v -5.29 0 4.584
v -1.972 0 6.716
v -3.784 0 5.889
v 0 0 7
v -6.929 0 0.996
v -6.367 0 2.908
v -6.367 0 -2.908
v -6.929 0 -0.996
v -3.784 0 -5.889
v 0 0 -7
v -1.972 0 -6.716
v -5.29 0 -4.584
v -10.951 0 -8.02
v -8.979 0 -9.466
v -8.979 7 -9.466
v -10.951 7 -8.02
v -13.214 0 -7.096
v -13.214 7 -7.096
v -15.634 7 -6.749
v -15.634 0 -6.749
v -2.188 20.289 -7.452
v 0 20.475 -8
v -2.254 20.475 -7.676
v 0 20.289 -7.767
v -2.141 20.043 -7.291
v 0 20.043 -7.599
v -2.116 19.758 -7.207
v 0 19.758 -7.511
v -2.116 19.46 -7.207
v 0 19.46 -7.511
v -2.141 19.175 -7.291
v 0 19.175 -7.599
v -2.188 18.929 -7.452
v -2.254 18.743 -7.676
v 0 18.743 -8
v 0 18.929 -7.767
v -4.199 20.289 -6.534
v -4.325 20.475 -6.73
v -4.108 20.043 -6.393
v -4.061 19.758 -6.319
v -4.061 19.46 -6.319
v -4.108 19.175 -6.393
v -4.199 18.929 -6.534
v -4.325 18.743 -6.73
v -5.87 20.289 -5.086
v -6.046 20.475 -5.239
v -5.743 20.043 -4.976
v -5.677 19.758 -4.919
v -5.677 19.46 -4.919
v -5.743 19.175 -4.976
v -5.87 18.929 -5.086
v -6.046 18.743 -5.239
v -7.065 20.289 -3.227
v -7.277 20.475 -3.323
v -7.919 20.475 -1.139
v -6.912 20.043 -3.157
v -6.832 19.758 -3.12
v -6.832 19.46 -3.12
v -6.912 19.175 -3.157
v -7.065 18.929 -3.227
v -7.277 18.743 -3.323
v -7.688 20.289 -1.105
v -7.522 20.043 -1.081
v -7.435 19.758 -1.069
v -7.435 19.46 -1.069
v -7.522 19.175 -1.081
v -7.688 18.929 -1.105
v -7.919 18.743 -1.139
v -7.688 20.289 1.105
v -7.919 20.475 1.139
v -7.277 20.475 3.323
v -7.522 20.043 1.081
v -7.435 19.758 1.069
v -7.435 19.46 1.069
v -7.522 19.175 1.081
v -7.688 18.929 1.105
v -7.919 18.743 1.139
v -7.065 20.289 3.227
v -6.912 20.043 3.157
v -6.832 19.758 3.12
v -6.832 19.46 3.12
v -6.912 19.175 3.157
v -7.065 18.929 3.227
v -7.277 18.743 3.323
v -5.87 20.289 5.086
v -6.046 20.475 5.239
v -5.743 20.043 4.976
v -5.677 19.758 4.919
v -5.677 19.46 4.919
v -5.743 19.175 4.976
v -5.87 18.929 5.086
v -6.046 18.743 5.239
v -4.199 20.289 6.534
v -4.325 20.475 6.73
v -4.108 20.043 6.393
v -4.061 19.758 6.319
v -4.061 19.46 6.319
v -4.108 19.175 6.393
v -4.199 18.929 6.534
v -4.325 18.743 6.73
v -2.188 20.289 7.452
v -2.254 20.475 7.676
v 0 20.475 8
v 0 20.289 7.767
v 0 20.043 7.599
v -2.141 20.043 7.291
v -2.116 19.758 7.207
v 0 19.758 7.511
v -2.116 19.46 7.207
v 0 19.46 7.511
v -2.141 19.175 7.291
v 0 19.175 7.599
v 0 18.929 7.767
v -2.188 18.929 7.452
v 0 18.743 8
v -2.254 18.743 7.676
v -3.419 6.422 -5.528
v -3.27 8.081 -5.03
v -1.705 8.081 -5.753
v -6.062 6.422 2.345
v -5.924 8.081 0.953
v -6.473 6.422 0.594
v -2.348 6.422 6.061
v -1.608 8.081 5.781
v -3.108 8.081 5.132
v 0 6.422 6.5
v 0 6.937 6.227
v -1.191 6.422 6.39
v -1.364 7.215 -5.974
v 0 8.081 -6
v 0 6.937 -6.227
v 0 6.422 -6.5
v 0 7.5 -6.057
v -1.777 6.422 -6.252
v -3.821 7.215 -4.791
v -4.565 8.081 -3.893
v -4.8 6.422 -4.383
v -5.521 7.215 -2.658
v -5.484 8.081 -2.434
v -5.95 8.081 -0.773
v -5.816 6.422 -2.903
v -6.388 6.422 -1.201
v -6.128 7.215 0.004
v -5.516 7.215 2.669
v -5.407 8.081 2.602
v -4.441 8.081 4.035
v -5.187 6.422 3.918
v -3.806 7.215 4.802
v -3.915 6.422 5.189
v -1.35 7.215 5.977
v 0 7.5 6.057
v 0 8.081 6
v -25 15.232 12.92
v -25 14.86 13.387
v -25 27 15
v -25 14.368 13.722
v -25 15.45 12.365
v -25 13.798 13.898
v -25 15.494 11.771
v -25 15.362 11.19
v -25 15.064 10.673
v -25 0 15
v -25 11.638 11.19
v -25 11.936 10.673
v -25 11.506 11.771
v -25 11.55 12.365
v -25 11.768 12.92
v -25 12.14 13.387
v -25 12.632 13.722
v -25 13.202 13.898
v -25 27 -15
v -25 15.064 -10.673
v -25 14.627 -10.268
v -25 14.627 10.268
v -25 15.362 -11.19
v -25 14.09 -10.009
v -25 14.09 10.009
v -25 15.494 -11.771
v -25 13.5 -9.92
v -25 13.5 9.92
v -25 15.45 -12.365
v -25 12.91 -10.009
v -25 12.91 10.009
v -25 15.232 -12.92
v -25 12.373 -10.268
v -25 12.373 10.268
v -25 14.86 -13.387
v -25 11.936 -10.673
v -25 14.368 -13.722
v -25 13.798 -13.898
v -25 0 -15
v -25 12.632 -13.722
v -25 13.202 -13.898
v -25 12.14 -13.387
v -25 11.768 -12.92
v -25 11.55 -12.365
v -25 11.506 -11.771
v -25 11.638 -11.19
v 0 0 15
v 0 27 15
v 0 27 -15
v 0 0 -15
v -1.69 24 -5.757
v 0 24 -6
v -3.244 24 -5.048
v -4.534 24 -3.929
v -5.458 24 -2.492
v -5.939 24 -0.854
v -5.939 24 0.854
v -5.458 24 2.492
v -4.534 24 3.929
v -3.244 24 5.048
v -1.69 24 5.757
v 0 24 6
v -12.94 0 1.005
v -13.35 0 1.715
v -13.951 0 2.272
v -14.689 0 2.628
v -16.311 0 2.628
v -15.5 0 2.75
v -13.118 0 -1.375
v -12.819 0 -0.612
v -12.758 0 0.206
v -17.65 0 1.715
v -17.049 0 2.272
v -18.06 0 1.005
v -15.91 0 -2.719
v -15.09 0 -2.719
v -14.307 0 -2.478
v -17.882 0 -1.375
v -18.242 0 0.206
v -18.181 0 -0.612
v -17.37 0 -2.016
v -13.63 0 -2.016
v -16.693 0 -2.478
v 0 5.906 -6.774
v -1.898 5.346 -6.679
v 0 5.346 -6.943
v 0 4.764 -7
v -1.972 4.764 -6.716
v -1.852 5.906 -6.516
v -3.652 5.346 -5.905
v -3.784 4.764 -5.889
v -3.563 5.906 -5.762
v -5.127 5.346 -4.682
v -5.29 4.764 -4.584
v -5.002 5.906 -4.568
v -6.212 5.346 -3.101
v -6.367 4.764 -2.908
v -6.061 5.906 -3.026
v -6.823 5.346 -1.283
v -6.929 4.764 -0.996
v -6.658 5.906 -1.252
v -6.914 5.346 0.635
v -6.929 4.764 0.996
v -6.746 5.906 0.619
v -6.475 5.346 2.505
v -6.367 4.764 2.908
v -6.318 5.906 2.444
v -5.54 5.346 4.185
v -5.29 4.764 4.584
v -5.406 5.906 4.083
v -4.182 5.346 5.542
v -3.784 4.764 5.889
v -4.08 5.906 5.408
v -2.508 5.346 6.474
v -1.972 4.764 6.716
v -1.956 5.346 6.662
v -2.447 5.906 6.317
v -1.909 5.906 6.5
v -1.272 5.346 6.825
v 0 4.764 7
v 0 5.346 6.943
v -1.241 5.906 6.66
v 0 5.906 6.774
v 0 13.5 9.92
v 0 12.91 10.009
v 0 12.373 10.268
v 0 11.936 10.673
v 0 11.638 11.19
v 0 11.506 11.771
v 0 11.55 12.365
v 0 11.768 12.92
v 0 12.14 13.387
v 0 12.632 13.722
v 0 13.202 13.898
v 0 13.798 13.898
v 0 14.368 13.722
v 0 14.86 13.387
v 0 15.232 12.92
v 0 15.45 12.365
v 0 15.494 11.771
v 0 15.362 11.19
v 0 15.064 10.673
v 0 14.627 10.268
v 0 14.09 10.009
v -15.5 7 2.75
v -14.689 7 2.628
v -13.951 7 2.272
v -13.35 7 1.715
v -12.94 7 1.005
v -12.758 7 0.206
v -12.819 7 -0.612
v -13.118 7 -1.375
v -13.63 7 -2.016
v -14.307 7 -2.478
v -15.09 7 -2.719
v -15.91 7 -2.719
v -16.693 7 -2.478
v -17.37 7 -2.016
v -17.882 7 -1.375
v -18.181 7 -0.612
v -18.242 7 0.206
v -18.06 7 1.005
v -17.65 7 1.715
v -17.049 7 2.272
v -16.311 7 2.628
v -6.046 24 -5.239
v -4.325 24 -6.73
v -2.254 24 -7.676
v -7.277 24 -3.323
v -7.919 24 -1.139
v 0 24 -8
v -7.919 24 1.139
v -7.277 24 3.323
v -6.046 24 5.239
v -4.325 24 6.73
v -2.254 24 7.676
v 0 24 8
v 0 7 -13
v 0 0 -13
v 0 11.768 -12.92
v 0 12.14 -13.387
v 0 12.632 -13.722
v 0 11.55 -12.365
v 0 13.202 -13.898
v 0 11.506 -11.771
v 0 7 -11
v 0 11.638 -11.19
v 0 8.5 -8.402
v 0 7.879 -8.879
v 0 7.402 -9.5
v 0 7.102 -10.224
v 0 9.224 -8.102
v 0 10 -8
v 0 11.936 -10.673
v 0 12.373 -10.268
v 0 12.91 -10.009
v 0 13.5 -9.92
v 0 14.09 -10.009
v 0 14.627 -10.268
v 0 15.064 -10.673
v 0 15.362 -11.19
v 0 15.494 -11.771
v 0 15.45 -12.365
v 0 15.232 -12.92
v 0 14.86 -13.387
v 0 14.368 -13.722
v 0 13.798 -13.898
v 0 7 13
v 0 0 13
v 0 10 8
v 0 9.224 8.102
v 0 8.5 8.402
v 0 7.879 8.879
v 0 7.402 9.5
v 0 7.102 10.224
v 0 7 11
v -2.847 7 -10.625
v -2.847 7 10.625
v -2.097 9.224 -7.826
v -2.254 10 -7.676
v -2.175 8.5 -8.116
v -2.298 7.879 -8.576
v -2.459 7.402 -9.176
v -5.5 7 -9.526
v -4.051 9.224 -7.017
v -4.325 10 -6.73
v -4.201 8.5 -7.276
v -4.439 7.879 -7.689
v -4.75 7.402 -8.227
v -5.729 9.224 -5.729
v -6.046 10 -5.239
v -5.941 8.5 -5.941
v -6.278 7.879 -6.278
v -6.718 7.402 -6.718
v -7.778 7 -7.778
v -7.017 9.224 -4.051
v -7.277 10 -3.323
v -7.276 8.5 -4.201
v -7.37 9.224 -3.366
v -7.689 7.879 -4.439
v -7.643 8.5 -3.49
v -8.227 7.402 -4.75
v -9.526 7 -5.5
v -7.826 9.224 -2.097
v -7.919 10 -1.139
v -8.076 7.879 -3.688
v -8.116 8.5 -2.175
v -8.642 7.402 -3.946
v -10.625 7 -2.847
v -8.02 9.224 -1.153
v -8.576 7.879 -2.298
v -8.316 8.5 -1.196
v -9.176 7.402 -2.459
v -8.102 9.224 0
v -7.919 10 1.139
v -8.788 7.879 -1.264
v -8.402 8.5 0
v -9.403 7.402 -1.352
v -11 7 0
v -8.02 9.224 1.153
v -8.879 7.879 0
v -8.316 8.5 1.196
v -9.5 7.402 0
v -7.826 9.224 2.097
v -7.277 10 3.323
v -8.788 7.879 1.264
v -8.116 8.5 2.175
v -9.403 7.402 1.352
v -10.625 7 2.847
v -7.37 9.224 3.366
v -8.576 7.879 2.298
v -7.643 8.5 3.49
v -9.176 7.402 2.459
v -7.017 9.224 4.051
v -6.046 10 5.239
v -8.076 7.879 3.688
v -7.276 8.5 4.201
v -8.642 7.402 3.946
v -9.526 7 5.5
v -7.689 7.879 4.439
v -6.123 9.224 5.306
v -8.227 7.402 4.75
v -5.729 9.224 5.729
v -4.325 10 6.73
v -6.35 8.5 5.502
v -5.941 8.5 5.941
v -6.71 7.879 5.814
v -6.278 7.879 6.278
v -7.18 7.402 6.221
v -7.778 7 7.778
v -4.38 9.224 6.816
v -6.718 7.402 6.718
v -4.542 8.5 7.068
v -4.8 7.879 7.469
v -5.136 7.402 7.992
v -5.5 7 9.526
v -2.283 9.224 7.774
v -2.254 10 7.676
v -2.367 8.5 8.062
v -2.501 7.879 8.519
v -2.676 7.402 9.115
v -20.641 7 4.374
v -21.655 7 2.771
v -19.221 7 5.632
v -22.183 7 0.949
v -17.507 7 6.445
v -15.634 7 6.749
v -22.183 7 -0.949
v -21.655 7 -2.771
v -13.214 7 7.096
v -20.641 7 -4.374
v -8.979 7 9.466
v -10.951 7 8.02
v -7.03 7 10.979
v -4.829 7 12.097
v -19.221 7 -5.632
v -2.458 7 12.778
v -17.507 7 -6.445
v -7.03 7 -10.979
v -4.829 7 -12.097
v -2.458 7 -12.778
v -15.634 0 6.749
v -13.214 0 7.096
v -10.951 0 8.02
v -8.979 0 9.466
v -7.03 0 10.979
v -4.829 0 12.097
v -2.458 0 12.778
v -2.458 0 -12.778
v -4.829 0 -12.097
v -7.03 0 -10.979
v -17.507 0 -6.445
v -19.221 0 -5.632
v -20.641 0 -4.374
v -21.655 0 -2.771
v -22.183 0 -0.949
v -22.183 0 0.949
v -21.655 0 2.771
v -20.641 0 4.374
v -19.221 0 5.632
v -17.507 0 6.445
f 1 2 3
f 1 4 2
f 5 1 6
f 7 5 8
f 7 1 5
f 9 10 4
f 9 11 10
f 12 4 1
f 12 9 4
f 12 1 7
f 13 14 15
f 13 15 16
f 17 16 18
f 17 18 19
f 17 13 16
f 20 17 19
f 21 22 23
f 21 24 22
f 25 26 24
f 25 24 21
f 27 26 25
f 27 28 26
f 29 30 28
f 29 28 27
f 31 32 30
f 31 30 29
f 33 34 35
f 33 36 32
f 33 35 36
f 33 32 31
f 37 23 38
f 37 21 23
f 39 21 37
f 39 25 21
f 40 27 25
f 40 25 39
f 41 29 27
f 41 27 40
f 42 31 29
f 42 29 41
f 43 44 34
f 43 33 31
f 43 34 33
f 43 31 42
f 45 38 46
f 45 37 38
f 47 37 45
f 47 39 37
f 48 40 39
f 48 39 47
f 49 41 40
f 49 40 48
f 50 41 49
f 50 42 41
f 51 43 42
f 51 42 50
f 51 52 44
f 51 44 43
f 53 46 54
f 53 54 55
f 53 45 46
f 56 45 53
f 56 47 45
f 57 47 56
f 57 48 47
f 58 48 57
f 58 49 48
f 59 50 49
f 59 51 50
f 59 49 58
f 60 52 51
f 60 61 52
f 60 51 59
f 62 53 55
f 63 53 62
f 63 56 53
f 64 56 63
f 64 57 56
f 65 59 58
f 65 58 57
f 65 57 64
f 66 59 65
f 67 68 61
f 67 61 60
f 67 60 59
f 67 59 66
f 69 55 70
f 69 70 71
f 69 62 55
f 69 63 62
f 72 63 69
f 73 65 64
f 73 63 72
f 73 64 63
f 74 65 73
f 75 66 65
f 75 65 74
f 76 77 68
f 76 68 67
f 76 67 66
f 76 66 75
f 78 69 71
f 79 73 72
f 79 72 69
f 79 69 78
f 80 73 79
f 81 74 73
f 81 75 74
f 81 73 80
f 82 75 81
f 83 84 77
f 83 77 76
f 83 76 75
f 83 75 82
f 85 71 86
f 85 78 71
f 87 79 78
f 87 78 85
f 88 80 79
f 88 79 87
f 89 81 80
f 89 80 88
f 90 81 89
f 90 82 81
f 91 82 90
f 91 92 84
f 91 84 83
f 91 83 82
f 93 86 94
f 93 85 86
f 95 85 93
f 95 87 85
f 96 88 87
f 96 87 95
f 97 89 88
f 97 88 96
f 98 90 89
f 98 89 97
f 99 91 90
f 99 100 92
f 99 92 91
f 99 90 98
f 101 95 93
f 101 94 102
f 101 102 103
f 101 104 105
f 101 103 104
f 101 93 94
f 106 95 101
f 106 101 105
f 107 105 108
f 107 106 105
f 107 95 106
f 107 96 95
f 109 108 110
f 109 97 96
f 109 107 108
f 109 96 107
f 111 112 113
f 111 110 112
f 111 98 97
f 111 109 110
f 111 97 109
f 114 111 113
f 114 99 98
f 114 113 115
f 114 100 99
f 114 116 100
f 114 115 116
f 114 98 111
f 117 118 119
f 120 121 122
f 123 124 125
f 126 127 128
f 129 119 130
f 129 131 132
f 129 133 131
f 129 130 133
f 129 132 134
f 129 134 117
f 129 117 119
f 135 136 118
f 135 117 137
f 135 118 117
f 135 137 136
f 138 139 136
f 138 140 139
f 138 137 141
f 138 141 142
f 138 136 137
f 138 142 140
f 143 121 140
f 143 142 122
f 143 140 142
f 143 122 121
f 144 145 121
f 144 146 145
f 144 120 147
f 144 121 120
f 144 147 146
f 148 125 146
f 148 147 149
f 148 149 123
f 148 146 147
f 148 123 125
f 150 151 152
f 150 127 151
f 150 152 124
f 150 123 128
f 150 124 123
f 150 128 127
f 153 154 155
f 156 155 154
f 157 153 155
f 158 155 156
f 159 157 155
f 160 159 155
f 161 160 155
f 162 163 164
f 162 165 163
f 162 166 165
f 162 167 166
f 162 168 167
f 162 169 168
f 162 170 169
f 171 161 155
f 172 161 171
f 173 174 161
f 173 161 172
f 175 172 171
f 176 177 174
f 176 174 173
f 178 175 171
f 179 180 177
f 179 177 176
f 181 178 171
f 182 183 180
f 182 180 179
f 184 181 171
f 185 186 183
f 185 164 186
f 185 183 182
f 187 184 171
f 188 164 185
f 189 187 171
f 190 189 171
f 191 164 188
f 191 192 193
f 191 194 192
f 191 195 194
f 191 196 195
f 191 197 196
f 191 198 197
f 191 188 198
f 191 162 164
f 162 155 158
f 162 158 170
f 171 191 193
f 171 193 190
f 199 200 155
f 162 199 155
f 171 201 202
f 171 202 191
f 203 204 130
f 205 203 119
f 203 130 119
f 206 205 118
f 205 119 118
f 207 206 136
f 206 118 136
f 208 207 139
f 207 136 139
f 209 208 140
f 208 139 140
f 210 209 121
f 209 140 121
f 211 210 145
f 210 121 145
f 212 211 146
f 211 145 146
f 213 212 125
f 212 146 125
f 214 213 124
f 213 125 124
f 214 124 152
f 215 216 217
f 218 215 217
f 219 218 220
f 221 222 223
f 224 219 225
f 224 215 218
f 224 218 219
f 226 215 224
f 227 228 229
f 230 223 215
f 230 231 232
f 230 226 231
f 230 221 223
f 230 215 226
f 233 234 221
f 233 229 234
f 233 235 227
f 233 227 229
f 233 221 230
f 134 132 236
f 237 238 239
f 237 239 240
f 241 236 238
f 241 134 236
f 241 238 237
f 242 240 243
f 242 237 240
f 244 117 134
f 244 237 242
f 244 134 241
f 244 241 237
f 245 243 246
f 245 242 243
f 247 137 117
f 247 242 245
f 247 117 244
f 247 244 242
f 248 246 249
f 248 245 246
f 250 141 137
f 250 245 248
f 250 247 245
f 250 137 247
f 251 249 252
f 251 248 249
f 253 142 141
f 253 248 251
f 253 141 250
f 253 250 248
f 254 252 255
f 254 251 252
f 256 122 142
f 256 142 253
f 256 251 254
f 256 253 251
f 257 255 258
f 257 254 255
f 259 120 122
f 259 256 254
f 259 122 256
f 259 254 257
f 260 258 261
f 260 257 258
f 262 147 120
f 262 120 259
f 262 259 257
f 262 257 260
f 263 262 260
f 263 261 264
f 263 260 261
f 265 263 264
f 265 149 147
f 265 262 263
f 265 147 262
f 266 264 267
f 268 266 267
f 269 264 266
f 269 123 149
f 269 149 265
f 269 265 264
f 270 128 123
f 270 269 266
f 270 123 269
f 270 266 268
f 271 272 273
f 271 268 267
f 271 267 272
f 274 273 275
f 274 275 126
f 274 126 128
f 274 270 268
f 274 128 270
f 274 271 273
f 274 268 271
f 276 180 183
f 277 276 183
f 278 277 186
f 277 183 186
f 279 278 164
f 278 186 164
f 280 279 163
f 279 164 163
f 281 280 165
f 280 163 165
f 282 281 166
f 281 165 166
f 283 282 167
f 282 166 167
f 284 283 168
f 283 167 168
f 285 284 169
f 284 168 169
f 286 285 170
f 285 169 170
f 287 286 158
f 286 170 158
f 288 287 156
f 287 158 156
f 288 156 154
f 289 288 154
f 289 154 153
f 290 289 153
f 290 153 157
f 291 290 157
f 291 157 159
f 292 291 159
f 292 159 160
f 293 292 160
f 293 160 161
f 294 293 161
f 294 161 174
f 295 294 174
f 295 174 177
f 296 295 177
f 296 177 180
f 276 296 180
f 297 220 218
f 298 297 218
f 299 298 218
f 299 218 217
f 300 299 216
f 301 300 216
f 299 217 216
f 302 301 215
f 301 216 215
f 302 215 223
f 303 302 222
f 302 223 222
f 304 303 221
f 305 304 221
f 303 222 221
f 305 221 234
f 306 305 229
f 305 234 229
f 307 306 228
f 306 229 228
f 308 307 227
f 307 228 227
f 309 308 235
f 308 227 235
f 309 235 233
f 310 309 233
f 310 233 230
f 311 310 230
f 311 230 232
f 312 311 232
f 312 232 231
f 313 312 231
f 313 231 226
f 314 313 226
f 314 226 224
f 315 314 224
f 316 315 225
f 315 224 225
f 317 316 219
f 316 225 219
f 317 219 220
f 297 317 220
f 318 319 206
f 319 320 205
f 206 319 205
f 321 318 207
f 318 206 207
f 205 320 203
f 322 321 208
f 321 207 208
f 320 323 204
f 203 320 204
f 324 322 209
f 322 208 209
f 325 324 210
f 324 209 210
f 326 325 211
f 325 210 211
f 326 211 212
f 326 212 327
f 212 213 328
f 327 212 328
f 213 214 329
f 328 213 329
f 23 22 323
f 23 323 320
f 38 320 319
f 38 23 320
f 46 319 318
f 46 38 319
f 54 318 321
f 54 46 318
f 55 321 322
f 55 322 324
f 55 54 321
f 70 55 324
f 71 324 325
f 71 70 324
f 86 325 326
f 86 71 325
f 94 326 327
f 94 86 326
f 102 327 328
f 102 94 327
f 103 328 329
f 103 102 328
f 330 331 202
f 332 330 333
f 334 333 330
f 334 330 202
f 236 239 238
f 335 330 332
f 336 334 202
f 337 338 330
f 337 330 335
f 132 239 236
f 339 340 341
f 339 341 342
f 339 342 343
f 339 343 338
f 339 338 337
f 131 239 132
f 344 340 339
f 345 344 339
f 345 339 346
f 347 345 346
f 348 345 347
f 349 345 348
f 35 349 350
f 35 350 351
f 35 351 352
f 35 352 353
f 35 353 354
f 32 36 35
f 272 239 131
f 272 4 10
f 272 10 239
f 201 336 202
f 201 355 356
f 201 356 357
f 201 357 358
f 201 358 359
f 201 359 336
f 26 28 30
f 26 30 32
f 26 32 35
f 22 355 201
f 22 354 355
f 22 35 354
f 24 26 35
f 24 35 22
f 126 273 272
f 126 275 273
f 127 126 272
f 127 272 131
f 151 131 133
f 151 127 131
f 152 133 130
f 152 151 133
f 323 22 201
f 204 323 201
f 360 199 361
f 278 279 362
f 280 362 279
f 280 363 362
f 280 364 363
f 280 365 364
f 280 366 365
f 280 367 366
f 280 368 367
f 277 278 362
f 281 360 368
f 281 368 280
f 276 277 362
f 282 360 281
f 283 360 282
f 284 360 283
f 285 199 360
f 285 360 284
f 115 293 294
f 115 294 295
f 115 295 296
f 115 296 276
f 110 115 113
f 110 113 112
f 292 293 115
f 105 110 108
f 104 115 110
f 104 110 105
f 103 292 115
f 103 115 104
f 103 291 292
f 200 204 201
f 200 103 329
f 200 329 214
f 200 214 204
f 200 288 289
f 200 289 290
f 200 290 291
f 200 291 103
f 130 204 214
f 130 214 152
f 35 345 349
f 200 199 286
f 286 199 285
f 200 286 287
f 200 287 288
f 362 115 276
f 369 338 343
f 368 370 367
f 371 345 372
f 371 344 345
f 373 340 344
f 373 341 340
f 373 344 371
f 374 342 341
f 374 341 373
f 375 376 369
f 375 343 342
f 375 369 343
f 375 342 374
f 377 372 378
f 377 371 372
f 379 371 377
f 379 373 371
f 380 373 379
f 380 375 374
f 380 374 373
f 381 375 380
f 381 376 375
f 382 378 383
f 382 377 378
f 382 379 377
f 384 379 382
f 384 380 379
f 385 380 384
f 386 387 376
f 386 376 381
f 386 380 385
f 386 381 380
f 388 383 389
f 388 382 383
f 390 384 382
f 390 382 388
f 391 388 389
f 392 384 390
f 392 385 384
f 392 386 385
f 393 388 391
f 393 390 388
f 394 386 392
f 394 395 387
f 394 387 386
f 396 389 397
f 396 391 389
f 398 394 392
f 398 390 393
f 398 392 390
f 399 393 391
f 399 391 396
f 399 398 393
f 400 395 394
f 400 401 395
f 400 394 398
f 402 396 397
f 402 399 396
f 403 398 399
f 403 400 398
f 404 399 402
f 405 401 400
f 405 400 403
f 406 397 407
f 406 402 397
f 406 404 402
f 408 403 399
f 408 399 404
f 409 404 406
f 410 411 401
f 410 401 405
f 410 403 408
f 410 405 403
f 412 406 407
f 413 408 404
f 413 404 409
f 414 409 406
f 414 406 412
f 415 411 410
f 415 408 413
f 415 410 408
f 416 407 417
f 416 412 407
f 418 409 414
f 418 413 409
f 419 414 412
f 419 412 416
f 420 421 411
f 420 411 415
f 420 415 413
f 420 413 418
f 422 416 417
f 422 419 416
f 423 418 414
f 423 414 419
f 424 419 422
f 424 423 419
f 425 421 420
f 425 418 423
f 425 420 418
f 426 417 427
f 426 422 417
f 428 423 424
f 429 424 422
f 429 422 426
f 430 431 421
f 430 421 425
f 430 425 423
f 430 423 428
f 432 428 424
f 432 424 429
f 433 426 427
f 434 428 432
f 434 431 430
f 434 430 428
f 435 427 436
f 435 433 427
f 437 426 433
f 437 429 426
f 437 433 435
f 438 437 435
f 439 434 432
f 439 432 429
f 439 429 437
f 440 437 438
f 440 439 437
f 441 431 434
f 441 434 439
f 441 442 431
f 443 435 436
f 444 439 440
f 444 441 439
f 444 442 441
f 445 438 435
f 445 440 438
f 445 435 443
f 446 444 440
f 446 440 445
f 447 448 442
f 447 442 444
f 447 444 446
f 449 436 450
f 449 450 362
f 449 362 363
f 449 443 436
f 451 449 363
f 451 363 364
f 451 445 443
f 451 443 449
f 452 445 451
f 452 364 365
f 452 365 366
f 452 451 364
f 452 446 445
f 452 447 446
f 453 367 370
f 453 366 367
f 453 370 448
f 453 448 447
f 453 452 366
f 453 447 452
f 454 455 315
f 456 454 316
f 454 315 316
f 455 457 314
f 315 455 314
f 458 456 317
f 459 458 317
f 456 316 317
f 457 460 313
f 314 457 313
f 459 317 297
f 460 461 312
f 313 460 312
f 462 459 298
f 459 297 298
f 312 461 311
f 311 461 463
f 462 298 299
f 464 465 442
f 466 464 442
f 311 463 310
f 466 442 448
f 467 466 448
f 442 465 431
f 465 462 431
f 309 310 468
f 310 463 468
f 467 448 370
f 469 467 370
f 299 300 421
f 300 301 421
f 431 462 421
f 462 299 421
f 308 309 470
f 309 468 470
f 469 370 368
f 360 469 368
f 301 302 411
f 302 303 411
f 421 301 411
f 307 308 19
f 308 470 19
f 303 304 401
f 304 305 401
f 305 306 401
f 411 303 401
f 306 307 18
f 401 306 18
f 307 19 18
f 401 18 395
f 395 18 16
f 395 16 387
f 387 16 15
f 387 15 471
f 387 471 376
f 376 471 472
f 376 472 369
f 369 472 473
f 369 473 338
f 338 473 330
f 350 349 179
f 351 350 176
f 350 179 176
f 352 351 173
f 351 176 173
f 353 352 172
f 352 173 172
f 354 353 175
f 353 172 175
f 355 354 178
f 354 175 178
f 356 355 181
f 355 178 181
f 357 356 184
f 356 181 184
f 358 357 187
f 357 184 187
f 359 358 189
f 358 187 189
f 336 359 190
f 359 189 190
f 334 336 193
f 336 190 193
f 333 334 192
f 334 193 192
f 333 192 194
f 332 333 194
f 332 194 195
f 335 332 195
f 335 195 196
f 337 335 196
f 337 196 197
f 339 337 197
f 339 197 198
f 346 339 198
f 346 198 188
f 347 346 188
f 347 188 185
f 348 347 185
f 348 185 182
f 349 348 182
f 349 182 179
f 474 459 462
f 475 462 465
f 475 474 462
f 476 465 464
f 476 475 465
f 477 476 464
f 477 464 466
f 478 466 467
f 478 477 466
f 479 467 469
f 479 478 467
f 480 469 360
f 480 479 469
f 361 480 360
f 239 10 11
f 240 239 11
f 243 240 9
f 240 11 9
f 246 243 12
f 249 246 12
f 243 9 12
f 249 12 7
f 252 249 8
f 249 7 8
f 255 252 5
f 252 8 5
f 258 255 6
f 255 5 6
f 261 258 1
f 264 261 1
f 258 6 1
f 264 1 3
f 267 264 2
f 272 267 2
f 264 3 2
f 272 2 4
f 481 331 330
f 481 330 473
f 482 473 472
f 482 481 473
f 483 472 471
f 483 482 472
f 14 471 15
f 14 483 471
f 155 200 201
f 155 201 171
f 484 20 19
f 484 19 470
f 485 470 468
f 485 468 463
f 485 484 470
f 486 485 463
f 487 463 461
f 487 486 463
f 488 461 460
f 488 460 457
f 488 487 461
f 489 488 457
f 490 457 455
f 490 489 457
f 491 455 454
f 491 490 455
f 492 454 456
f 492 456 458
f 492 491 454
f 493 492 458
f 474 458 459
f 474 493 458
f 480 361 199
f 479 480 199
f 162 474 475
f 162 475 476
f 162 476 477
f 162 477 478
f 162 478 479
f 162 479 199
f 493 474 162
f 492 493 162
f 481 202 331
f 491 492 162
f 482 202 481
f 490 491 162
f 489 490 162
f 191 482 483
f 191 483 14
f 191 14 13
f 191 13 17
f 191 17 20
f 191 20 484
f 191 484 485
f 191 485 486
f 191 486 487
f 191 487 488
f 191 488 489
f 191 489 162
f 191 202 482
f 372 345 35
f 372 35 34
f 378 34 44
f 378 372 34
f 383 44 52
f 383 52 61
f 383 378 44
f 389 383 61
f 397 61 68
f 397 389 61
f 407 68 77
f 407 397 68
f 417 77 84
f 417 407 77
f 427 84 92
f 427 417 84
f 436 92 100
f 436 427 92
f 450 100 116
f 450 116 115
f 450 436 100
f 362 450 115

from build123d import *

# Parameters (mm, degrees)
SKETCH1_R            = 7
SKETCH1_R_2          = 2.75
SKETCH1_R_3          = 3.659852489
BOSS_EXTRUDE1_DEPTH  = 7
SKETCH2_R            = 8
SKETCH2_R_2          = 6
BOSS_EXTRUDE2_DEPTH  = 17
FILLET1_R            = 3
FILLET2_R            = 3
SKETCH3_R            = 1
SKETCH5_W            = 50
SKETCH5_H            = 30
BOSS_EXTRUDE3_DEPTH  = 27
SKETCH6_R            = 2
CUT_EXTRUDE1_DEPTH   = 57
INTERSECT3_OUTLINE_W = 27
INTERSECT3_OUTLINE_H = 30
INTERSECT3_OUTLINE_R = 2
INTERSECT3_DEPTH     = 25


with BuildPart() as part:
    # Sketch1 → Boss-Extrude1 (new body)
    with BuildSketch(Plane(origin=(0, 0, 0), x_dir=(1, 0, 0), z_dir=(0, 1, 0))):
        with BuildLine():
            ThreePointArc((-15.634333704, 6.748663161), (-22.25, 0), (-15.634333704, -6.748663161))
            ThreePointArc((-15.634333704, -6.748663161), (-12.054001616, -7.488359295), (-8.978814065, -9.465516285))
            ThreePointArc((-8.978814065, -9.465516285), (-0.448762307, -12.99442036), (8.273320847, -9.971141939))
            ThreePointArc((8.273320847, -9.971141939), (11.493139678, -8.165901558), (15.148520579, -7.651784261))
            ThreePointArc((15.148520579, -7.651784261), (23.159852489, 0), (15.148520579, 7.651784261))
            ThreePointArc((15.148520579, 7.651784261), (11.493139678, 8.165901558), (8.273320847, 9.971141939))
            ThreePointArc((8.273320847, 9.971141939), (-0.448762307, 12.99442036), (-8.978814065, 9.465516285))
            ThreePointArc((-8.978814065, 9.465516285), (-12.054001616, 7.488359295), (-15.634333704, 6.748663161))
        make_face()
        with Locations(Location((0, 0, 0), (0, 0, 270))):
            Circle(SKETCH1_R, mode=Mode.SUBTRACT)
        with Locations(Location((-15.5, 0, 0), (0, 0, 270))):
            Circle(SKETCH1_R_2, mode=Mode.SUBTRACT)
        with Locations(Location((15.5, 0, 0), (0, 0, 270))):
            Circle(SKETCH1_R_3, mode=Mode.SUBTRACT)
    extrude(amount=BOSS_EXTRUDE1_DEPTH)

    # Sketch2 → Boss-Extrude2 (add)
    with BuildSketch(Plane(origin=(0, 7, 0), x_dir=(1, 0, 0), z_dir=(0, 1, 0))):
        with Locations(Location((0, 0, 0), (0, 0, 270))):
            Circle(SKETCH2_R)
        with Locations(Location((0, 0, 0), (0, 0, 270))):
            Circle(SKETCH2_R_2, mode=Mode.SUBTRACT)
    extrude(amount=BOSS_EXTRUDE2_DEPTH)

    # Fillet1
    # the kernel refuses this fillet: 3 mm, written as the material it adds along each edge
    with BuildSketch(Plane(origin=(0, 7, 0), x_dir=(0, 0, 1), z_dir=(-1, 0, 0))) as fillet1_piece_1:
        with BuildLine():
            CenterArc((4, -2.236067977), FILLET1_R, 0, 48.189685104)
            Line((6, 0), (6.04, 0.04472136))
            ThreePointArc((6.04, 0.04472136), (6.5, 0.06), (7, 0.06))
            Line((7, 0.06), (7.06, 0))
            Line((7.06, 0), (7.06, -2.236067977))
            Line((7.06, -2.236067977), (7, -2.236067977))
        make_face()
    revolve(axis=Axis((0, 7, 0), (0, 1, 0)))
    with BuildSketch(Plane(origin=(0, 7, 0), x_dir=(0, 0, 1), z_dir=(-1, 0, 0))) as fillet1_piece_2:
        with BuildLine():
            CenterArc((8 + FILLET1_R, FILLET1_R), FILLET1_R, 180, 90)
            Line((8, FILLET1_R), (8 - FILLET1_R * 0.02, FILLET1_R))
            Line((8 - FILLET1_R * 0.02, FILLET1_R), (8 - FILLET1_R * 0.02, -FILLET1_R * 0.02))
            Line((8 - FILLET1_R * 0.02, -FILLET1_R * 0.02), (8 + FILLET1_R, -FILLET1_R * 0.02))
            Line((8 + FILLET1_R, -FILLET1_R * 0.02), (8 + FILLET1_R, 0))
        make_face()
    revolve(axis=Axis((0, 7, 0), (0, 1, 0)))

    # Fillet2
    fillet2_edges = [part.edges().sort_by_distance(p)[0] for p in [
        (0, 7, -6),
    ]]
    fillet(fillet2_edges, radius=FILLET2_R)


with BuildPart() as body_2:
    # Sketch3 → Revolve1 (revolve)
    with BuildSketch(Plane(origin=(0, 0, 0), x_dir=(0, 0, -1), z_dir=(1, 0, 0))):
        with Locations((8.5, 19.608844607)):
            Circle(SKETCH3_R)
    revolve(axis=Axis((0, 0, 0), (0, 1, 0)))


with BuildPart() as part_1:
    add(part.part)

    # Intersect1: read off the stored shape, not the designer's step
    # Intersect1: cut body 2
    add(body_2.part, mode=Mode.SUBTRACT)


with BuildPart() as body_2_2:
    # Sketch5 → Boss-Extrude3 (new body)
    with BuildSketch(Plane(origin=(0, 0, 0), x_dir=(-1, 0, 0), z_dir=(0, -1, 0))):
        Rectangle(SKETCH5_W, SKETCH5_H)
    extrude(amount=-BOSS_EXTRUDE3_DEPTH)

    # Sketch6 → Cut-Extrude1 (cut)
    with BuildSketch(Plane.ZY.offset(25)):
        with Locations((-11.920412871, 13.5)):
            Circle(SKETCH6_R)
        with Locations(Location((11.920412871, 13.5, 0), (0, 0, 180))):
            Circle(SKETCH6_R)
    extrude(amount=-CUT_EXTRUDE1_DEPTH, mode=Mode.SUBTRACT)

    # Intersect2: read off the stored shape, not the designer's step
    # Intersect2: cut part
    add(part_1.part, mode=Mode.SUBTRACT)

    # Intersect3: read off the stored shape, not the designer's step
    # Intersect3 outline → Intersect3 (cut)
    with BuildSketch(Plane.YZ):
        with Locations((13.5, 0)):
            Rectangle(INTERSECT3_OUTLINE_W, INTERSECT3_OUTLINE_H)
        with Locations((13.5, -11.920412871)):
            Circle(INTERSECT3_OUTLINE_R, mode=Mode.SUBTRACT)
        with Locations((13.5, 11.920412871)):
            Circle(INTERSECT3_OUTLINE_R, mode=Mode.SUBTRACT)
    extrude(amount=INTERSECT3_DEPTH, mode=Mode.SUBTRACT)


solid = body_2_2.part
